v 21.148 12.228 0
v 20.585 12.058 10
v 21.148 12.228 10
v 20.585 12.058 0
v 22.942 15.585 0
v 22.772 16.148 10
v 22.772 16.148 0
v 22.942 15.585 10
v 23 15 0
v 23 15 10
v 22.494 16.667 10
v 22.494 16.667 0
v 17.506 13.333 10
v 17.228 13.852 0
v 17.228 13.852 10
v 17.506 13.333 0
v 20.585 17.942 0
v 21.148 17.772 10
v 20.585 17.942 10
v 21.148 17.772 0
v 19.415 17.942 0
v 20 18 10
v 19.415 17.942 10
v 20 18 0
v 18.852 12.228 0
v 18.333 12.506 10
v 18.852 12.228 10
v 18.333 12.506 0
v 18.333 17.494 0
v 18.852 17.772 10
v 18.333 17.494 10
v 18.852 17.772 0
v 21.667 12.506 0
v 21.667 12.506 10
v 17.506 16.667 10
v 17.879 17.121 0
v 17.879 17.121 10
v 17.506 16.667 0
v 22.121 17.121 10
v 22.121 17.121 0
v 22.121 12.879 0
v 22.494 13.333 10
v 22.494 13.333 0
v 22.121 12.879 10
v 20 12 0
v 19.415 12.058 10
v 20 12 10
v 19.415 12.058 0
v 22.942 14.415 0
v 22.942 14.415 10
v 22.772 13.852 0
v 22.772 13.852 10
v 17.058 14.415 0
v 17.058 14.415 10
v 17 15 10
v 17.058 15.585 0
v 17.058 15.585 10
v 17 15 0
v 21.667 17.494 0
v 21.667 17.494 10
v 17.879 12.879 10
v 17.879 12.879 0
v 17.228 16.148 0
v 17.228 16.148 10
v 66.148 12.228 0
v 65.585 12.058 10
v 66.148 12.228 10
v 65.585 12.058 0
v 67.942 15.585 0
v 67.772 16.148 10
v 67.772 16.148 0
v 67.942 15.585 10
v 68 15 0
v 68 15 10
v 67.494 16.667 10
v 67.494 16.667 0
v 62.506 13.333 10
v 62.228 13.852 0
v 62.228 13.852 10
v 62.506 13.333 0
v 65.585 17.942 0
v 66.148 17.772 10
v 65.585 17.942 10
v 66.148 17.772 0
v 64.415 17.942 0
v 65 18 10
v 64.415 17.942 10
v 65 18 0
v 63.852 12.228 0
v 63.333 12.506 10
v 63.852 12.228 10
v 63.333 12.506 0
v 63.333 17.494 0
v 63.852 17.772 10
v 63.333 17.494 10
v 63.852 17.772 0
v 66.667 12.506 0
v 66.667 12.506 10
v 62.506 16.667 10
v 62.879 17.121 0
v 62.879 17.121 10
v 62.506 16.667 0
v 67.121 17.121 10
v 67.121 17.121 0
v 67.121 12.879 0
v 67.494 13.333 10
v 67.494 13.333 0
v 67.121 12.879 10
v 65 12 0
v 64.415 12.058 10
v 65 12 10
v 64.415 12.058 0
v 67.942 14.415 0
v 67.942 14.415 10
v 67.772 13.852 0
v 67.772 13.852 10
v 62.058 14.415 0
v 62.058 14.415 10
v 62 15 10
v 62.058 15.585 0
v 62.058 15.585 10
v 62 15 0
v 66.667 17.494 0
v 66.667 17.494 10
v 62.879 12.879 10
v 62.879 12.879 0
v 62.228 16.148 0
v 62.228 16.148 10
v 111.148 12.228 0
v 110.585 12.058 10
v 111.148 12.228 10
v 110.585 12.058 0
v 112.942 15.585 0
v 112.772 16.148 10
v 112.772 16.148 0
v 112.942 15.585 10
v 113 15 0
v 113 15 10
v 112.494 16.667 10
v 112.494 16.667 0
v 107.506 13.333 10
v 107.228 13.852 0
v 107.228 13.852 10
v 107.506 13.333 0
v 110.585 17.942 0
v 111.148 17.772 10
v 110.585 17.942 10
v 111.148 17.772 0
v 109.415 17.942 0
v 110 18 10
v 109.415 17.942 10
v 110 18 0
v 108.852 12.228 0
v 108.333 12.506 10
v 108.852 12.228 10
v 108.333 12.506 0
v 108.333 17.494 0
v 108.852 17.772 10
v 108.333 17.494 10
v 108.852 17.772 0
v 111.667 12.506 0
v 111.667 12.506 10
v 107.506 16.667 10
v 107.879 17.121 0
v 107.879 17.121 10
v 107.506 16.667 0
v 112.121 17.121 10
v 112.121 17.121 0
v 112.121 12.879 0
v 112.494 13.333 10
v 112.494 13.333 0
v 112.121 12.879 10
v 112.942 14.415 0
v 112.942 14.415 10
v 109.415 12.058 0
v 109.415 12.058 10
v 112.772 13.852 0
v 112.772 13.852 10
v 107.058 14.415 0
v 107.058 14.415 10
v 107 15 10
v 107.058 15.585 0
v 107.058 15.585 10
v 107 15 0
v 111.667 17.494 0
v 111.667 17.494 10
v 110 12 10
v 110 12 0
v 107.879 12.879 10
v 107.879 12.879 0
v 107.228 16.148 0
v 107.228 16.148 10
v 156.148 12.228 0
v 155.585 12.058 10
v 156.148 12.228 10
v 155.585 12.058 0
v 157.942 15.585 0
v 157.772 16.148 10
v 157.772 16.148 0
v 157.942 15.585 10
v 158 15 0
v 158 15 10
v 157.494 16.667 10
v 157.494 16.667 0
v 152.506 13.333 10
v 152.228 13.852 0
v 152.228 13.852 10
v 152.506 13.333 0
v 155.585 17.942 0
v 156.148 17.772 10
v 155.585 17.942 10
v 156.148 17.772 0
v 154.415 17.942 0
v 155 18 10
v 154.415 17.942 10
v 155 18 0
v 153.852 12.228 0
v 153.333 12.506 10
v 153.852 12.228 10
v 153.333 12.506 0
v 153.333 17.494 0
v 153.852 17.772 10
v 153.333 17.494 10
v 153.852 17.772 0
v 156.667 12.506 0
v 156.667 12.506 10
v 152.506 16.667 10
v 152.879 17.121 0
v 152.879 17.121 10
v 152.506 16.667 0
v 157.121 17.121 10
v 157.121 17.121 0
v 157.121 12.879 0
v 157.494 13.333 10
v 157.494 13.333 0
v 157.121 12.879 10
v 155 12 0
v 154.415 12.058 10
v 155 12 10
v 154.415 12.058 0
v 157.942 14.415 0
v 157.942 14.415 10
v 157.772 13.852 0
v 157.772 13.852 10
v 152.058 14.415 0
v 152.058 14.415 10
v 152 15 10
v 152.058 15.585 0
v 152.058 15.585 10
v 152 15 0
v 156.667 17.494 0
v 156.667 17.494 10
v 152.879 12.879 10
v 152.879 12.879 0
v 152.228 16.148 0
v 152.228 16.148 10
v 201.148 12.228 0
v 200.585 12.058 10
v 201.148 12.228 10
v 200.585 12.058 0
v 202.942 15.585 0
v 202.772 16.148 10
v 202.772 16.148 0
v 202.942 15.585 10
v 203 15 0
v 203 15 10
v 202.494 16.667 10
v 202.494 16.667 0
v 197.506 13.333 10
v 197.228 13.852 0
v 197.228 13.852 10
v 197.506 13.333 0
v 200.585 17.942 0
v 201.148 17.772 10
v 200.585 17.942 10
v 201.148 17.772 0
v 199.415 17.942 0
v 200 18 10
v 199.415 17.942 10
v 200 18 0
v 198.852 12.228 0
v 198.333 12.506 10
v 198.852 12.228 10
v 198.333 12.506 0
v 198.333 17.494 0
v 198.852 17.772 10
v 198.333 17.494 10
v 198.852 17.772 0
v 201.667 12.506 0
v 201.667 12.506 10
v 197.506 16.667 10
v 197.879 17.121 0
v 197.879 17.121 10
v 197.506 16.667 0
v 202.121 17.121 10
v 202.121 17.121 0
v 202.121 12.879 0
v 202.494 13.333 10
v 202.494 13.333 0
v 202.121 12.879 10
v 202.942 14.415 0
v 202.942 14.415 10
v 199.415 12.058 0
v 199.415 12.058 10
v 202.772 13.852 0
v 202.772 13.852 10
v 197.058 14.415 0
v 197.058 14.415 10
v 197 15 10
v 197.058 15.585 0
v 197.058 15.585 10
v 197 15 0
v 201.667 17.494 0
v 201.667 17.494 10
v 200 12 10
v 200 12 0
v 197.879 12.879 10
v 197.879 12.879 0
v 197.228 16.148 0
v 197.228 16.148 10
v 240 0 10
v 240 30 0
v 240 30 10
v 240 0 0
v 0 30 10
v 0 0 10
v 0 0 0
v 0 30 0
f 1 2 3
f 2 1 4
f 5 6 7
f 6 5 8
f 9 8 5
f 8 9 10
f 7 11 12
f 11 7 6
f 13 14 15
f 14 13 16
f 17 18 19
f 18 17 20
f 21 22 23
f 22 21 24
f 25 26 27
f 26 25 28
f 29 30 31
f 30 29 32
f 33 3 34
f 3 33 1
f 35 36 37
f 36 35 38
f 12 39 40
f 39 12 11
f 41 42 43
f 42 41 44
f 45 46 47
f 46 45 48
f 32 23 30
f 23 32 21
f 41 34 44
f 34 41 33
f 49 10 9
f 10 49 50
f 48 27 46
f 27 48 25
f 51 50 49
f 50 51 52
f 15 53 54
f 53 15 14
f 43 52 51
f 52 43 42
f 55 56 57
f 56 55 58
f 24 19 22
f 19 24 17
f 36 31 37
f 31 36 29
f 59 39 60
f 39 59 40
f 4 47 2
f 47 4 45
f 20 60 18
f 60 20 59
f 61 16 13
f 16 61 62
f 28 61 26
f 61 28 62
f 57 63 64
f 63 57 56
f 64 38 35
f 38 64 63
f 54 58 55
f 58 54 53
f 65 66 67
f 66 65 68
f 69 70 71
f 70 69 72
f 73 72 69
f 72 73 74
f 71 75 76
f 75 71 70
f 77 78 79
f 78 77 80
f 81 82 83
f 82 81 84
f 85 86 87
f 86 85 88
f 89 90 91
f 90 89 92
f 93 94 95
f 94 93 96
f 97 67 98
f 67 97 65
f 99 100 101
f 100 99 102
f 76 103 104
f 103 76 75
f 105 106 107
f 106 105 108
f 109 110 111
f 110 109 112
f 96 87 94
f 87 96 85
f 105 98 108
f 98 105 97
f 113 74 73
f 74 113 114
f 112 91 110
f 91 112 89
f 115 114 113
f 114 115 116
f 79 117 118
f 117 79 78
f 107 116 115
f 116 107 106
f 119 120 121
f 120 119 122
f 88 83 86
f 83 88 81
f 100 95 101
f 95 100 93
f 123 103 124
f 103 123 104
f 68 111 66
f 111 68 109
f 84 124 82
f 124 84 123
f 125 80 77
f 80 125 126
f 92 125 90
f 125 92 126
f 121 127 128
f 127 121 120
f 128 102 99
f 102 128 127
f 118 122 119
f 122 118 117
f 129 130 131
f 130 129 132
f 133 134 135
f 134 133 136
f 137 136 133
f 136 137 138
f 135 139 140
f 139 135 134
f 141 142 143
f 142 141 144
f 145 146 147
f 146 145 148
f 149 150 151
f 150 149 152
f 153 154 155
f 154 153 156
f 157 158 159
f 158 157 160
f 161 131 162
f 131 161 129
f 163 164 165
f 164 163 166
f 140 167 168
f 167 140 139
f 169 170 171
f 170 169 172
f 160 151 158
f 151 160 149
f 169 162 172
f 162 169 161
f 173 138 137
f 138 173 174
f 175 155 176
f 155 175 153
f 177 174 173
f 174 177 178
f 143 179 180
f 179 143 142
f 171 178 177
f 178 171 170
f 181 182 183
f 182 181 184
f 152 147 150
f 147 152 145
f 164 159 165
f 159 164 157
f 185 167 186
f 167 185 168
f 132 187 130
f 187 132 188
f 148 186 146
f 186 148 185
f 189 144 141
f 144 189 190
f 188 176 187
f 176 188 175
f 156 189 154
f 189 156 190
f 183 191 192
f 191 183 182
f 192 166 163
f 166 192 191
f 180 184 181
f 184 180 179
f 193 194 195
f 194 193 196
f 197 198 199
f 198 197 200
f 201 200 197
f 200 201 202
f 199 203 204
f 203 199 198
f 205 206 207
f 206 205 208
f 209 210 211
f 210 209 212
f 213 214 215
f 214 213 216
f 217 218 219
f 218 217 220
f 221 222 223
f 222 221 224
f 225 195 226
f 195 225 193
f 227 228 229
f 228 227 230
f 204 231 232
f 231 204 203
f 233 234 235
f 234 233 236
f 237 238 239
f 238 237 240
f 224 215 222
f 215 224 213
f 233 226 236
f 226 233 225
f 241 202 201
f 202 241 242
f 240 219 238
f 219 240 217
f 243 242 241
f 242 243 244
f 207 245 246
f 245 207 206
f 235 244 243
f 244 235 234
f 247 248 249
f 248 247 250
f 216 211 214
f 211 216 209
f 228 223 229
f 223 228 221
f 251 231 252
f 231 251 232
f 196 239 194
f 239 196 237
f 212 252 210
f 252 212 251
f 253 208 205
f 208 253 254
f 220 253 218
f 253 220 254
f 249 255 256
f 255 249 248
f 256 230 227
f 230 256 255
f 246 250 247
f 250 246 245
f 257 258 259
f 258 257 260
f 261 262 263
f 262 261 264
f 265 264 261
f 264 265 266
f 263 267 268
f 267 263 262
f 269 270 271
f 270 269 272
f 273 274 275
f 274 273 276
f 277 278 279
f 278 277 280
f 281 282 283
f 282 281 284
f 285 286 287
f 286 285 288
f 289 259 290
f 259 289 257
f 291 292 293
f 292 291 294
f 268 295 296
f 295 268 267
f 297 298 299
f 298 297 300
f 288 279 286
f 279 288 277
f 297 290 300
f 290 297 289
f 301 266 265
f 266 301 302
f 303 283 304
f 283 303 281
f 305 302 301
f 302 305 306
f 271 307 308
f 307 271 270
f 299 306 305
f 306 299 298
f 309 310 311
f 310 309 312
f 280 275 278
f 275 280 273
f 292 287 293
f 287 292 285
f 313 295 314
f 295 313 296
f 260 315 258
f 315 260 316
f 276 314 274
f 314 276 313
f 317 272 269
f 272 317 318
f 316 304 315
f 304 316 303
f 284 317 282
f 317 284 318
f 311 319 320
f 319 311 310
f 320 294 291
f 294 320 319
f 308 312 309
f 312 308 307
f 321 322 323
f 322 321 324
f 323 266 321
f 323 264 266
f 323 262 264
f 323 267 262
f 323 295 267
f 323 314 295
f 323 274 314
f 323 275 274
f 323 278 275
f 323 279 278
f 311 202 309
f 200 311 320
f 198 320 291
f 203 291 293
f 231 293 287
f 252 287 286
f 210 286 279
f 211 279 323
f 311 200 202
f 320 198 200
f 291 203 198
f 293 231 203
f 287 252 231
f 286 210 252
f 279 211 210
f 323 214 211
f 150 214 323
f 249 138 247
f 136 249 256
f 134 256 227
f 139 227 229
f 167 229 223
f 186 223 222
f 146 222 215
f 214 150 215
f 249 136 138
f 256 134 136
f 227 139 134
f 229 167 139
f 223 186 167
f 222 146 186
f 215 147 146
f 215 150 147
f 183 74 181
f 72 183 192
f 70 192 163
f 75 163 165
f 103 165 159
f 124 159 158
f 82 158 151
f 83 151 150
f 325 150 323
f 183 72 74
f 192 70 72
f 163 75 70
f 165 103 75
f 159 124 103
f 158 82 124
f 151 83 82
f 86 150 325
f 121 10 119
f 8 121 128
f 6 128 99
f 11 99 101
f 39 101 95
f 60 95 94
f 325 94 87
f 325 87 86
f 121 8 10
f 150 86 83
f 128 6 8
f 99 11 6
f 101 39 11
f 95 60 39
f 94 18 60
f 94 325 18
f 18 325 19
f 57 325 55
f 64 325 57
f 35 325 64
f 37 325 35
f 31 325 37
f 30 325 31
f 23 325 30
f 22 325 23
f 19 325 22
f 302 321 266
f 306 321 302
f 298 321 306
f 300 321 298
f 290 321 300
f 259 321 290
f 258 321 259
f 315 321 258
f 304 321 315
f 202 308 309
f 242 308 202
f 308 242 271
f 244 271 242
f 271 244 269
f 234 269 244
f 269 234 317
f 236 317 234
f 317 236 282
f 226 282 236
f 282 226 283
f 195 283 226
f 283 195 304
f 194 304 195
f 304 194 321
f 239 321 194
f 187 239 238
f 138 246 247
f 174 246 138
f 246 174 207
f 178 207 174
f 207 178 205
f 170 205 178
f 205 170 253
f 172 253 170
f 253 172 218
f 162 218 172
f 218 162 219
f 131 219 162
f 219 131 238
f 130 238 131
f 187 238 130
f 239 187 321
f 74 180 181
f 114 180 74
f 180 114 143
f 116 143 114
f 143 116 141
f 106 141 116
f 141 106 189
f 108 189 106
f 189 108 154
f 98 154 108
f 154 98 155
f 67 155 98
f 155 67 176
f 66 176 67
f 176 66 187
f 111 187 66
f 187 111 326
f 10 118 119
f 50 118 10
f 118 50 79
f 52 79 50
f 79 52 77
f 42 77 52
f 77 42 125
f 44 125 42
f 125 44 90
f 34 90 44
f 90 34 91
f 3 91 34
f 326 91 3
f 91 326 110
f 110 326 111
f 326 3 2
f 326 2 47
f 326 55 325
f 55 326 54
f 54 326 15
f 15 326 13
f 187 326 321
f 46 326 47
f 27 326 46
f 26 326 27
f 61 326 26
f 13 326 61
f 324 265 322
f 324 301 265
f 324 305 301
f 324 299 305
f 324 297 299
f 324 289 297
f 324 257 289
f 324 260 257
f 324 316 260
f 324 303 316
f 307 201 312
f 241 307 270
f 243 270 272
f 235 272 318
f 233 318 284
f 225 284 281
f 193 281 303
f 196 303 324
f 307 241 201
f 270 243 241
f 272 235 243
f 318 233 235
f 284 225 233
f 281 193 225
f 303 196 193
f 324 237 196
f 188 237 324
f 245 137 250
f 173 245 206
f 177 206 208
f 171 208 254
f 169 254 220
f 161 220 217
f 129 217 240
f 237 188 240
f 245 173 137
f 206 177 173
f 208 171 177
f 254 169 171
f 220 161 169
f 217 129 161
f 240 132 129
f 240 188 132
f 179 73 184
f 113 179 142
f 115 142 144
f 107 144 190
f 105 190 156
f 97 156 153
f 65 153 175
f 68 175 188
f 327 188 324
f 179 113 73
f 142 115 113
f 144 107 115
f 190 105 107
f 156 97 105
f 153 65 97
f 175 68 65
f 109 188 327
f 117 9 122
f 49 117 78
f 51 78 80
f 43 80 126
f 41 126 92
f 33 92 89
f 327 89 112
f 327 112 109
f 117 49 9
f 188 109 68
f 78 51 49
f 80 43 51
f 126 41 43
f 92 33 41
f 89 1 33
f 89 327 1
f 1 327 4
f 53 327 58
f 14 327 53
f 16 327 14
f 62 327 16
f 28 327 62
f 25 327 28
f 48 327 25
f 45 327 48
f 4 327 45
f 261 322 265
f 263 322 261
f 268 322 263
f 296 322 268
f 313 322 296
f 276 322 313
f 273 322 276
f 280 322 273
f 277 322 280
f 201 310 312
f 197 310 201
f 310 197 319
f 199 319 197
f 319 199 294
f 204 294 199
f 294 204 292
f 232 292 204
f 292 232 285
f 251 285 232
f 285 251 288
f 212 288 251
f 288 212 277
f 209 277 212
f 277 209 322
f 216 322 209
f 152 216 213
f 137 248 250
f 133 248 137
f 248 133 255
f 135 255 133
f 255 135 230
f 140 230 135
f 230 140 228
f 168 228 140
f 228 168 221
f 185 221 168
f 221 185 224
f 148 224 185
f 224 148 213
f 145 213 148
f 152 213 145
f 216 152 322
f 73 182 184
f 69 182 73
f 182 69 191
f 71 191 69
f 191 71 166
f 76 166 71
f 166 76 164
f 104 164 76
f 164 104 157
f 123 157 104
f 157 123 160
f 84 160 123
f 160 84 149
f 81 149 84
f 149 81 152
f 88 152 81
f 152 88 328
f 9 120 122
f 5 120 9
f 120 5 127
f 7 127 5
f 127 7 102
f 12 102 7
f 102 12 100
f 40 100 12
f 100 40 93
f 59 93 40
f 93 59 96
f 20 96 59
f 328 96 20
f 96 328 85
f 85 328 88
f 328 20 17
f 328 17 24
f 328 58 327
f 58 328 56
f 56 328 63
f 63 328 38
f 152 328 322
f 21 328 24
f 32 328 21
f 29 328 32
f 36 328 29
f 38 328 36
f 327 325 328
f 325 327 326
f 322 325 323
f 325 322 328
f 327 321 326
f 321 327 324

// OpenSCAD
$fn = 32;

// ----------------------------------------------------------------------
// Long rail: 200-250 mm mounting rail
// ----------------------------------------------------------------------

// --- parameters (mm) ---
rail_l = 240;             // rail length, X
rail_w = 30;              // rail width, Y
rail_t = 10;              // rail thickness, Z
hole_d = 6;               // mounting hole diameter
hole_start = 20;          // first hole offset from the end
hole_pitch = 45;          // hole pitch
holes = 5;                // number of holes
fit_tol = 0.05;           // tolerance for press fits, mm
free_tol = 0.3;           // tolerance for clearance fits, mm

difference() {
  cube([rail_l, rail_w, rail_t]);
  for (i = [0 : holes - 1])
    translate([hole_start + i * hole_pitch, rail_w / 2, -1])
      cylinder(h = rail_t + 2, d = hole_d);
}
